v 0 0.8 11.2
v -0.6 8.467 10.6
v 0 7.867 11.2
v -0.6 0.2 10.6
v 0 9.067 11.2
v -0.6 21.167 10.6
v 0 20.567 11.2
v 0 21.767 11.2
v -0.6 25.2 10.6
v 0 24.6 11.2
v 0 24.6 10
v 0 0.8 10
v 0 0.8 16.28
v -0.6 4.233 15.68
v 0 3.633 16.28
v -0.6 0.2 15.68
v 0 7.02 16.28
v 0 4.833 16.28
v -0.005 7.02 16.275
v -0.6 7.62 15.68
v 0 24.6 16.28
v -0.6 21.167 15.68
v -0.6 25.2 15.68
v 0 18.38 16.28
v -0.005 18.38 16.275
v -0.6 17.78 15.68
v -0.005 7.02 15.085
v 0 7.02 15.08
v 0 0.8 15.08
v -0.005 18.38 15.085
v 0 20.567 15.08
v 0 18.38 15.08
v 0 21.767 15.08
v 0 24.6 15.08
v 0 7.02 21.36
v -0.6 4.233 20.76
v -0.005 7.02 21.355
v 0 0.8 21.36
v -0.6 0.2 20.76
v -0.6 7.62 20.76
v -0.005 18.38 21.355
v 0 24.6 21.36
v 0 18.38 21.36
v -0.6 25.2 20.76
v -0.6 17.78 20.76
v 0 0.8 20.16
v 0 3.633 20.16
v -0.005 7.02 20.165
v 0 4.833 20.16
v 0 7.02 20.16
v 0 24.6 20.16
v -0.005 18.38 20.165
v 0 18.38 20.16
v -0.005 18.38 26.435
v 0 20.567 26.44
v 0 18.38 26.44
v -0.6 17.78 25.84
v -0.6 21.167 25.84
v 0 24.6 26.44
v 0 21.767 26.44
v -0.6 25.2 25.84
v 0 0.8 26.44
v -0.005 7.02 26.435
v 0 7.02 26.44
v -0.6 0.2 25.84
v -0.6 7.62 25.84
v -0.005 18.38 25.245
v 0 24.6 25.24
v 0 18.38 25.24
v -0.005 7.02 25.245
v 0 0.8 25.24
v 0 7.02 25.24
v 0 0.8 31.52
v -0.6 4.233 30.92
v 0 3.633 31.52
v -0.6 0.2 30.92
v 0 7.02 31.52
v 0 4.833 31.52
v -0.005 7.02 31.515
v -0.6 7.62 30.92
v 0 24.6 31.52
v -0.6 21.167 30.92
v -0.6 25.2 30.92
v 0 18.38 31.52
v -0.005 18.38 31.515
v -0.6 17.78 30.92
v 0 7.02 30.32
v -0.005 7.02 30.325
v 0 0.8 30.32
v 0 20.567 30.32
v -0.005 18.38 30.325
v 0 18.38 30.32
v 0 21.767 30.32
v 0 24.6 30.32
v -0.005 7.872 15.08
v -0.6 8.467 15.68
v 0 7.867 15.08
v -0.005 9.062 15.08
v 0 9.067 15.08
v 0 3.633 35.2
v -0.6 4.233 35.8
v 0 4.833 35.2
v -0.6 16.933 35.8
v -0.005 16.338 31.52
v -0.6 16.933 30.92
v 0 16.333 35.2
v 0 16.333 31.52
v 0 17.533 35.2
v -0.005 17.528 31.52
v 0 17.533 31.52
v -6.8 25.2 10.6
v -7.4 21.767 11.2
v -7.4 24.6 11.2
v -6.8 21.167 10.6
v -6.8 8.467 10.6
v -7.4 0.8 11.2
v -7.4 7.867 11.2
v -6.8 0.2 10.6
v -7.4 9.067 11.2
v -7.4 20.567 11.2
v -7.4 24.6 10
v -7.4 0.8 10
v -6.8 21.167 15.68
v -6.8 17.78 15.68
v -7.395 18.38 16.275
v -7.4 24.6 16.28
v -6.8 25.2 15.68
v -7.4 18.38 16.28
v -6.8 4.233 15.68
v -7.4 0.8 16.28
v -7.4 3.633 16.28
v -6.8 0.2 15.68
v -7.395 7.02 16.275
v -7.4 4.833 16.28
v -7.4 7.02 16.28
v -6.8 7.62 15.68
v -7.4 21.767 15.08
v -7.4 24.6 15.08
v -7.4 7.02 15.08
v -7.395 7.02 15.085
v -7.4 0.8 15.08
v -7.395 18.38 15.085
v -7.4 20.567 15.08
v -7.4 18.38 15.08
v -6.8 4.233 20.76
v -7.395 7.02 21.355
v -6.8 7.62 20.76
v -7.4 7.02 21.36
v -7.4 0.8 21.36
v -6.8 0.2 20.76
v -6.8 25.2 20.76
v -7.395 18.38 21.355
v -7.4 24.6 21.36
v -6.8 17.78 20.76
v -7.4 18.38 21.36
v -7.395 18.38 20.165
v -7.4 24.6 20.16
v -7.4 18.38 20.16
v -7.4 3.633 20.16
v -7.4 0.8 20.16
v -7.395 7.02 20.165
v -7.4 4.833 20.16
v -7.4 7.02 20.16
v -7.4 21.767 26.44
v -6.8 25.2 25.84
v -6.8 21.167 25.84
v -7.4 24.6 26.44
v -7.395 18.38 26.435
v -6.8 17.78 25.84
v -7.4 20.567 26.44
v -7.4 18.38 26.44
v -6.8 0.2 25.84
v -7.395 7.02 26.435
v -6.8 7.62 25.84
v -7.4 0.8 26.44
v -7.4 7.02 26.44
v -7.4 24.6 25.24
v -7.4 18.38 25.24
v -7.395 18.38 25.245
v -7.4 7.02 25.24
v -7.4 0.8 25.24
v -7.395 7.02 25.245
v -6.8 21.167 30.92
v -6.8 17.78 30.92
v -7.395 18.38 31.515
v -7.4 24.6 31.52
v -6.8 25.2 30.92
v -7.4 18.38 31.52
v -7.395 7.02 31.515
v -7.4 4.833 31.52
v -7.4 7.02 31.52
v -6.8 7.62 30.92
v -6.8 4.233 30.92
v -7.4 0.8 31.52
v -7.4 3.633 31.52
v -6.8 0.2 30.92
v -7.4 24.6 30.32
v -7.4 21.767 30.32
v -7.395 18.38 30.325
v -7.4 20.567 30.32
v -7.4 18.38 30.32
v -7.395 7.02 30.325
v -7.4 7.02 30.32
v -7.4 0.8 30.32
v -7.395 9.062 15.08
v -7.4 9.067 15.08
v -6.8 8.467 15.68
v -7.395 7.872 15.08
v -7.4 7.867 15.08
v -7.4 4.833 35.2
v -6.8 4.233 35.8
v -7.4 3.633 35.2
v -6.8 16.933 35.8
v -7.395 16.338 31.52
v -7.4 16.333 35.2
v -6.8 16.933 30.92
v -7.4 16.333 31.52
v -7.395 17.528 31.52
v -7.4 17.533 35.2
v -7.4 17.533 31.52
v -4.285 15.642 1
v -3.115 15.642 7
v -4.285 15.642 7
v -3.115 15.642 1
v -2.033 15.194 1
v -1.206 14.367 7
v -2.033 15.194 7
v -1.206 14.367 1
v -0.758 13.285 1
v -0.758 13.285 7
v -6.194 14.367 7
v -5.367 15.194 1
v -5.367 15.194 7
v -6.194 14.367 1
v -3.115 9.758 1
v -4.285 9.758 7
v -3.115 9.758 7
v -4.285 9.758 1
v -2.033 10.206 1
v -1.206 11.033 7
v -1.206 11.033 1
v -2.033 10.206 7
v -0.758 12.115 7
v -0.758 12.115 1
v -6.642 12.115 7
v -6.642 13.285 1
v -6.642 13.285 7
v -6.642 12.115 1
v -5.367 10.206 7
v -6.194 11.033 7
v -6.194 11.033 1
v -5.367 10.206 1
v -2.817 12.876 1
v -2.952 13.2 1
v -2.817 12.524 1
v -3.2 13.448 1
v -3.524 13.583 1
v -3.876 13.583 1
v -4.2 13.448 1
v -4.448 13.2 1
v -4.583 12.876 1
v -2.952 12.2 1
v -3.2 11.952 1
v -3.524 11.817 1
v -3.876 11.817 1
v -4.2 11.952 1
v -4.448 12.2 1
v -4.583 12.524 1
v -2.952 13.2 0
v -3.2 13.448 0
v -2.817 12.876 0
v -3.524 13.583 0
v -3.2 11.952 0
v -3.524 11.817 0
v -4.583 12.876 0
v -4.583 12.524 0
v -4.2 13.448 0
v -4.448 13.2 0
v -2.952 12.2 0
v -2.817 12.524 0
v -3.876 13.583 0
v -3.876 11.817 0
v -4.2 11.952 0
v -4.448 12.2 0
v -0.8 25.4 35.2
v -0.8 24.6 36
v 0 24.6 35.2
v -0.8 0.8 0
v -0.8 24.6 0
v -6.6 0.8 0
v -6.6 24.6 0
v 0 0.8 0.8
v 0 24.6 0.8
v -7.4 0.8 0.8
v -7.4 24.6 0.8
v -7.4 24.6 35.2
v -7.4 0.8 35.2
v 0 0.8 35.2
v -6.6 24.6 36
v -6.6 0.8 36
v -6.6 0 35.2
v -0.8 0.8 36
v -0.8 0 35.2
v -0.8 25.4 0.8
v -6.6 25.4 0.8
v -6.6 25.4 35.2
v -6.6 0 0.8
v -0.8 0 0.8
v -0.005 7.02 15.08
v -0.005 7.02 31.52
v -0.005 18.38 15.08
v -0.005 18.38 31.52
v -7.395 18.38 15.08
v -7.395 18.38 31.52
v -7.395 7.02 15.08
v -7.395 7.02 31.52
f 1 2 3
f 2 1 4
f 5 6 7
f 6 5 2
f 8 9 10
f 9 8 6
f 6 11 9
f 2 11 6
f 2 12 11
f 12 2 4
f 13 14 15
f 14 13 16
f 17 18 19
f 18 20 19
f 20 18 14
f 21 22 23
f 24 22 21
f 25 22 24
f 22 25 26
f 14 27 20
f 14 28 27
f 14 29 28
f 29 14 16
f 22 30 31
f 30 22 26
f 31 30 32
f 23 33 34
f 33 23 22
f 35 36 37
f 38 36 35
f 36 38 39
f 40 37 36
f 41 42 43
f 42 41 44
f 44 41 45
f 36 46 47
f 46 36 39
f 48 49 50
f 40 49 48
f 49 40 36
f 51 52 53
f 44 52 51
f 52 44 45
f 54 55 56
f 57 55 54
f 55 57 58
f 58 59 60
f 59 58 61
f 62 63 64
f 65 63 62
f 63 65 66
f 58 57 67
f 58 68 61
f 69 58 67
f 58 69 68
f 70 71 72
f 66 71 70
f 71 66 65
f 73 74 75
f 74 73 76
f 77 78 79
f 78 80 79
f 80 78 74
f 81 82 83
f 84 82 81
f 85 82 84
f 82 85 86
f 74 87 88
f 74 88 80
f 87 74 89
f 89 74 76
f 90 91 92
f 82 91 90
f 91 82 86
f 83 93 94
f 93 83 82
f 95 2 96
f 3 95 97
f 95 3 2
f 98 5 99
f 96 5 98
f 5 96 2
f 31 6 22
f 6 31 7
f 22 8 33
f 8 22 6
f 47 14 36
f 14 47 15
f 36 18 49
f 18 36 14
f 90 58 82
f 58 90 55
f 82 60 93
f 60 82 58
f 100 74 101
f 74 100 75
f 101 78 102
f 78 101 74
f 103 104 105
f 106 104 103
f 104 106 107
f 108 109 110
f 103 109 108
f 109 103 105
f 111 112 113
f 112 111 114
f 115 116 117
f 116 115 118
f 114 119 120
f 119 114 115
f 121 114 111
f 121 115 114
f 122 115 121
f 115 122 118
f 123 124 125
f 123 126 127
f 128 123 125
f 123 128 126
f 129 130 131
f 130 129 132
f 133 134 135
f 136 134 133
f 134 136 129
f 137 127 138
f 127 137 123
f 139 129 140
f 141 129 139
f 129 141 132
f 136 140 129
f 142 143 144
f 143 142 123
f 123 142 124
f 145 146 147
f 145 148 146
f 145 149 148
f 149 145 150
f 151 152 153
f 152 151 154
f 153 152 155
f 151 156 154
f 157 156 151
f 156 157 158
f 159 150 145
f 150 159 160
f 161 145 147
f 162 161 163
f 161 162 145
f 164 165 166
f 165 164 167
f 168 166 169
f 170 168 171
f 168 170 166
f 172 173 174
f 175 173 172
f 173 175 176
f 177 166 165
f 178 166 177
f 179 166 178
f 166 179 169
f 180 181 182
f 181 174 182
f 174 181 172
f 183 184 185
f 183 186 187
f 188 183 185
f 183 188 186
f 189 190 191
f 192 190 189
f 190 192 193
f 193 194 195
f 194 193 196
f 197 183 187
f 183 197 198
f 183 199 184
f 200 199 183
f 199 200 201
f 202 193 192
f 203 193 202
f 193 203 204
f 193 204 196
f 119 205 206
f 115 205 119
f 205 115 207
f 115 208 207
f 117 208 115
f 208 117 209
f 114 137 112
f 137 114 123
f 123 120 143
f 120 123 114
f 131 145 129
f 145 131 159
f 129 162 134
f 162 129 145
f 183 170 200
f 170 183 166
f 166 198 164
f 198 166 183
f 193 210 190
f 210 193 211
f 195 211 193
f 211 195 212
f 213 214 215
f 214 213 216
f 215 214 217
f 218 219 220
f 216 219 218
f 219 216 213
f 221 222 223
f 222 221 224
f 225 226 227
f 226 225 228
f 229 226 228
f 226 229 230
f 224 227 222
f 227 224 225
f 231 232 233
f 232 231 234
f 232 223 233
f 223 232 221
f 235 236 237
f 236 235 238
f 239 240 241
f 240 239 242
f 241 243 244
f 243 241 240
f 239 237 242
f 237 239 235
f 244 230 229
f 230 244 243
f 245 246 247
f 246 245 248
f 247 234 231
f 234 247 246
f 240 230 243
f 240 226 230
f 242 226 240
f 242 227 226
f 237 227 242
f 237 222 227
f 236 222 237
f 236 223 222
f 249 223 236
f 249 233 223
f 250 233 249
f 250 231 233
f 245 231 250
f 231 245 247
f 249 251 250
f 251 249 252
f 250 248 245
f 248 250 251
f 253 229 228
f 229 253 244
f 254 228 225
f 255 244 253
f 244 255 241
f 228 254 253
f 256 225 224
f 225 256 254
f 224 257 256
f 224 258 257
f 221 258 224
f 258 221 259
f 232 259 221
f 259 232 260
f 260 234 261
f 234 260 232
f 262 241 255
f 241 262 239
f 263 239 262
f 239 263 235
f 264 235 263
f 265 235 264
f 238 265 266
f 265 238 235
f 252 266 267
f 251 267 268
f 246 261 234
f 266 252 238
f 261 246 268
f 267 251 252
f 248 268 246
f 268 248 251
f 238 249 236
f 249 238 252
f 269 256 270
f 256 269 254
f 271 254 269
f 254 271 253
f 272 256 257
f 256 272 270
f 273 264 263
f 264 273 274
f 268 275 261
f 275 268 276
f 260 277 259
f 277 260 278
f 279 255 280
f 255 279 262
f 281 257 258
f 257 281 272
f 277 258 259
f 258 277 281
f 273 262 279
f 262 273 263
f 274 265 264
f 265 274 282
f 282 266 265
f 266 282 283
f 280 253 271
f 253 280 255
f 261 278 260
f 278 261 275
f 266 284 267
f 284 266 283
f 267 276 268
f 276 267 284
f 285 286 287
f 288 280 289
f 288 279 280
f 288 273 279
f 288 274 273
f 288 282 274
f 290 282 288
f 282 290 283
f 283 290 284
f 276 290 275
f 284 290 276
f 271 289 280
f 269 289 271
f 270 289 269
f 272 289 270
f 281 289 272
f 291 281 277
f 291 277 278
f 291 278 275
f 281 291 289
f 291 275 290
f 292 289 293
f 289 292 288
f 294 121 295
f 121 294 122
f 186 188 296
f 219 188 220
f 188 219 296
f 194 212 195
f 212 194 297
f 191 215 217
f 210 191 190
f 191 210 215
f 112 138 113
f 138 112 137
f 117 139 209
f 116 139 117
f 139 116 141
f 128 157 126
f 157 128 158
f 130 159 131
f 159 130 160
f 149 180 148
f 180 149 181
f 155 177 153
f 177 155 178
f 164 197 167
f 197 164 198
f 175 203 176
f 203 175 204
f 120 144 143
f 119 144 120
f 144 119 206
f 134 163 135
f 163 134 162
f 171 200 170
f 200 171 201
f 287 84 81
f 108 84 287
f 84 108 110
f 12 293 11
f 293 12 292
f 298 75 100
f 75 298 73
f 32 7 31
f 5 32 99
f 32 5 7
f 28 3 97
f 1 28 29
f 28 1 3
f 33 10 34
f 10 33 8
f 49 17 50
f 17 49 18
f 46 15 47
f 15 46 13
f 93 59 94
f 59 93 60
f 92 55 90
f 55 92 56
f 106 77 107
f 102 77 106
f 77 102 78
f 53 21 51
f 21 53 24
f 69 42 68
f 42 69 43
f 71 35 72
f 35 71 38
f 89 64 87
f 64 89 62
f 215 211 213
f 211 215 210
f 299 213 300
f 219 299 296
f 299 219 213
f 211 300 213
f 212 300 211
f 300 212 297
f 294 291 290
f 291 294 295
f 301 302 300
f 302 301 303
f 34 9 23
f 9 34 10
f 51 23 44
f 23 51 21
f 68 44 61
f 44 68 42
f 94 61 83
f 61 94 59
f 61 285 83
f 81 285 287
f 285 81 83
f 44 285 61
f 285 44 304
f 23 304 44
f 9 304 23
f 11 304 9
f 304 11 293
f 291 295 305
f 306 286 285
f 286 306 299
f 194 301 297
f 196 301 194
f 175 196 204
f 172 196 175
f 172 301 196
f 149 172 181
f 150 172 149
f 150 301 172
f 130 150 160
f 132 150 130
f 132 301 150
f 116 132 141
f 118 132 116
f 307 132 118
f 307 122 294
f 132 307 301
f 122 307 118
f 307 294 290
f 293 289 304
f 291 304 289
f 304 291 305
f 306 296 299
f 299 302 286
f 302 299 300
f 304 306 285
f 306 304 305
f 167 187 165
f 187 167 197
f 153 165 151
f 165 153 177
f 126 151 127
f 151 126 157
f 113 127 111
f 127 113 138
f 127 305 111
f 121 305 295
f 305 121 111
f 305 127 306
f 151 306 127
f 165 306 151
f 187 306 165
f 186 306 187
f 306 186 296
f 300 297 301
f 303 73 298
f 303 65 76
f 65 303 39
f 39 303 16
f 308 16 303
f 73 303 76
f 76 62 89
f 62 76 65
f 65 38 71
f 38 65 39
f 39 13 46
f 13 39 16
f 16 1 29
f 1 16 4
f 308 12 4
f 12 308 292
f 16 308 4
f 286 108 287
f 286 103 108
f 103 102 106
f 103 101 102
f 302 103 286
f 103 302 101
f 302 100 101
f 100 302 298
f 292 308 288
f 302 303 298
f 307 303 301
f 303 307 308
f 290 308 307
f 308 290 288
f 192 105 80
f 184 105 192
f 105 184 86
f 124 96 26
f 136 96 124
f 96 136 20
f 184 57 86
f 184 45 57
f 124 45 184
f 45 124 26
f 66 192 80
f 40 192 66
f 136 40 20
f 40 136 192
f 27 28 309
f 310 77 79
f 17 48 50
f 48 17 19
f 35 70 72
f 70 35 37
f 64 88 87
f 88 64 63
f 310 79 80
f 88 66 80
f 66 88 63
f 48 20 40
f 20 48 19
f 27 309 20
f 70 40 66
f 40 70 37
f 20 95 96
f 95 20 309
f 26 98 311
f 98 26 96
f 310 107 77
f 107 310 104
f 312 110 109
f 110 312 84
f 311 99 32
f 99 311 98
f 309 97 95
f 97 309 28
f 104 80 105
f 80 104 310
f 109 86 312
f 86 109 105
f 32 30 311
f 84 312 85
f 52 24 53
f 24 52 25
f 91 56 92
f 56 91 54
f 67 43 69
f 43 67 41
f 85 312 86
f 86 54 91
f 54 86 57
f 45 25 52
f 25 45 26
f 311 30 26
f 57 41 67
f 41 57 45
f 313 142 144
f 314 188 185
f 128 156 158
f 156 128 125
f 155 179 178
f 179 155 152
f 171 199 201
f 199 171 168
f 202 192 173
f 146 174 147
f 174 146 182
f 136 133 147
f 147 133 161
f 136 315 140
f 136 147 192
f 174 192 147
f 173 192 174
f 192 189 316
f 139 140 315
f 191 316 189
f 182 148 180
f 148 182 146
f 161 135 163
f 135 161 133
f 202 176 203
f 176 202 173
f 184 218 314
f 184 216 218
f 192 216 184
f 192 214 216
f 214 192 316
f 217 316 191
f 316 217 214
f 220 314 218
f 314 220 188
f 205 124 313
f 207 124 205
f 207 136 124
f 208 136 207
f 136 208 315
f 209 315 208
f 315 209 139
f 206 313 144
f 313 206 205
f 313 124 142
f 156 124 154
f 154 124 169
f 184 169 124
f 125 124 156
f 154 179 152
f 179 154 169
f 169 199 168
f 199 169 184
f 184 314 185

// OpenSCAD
// file: wall_01_solid.scad
include <libs.scad>;

//wall
*linear_wall(4);
*round_wall(2);
corner_wall(6);
*shim_wall(2);
*import("finalized_stl/square_floor/floor_square_2x2_a.stl");

module shim_wall(size)
{
  translate([-wall_width/2,size*basis/2,floor_thick/2])hull()
  {
    cube([wall_width,basis*size-bevel*2,floor_thick-bevel*2],center=true);
    cube([wall_width-bevel*2,basis*size,floor_thick-bevel*2],center=true);
    cube([wall_width-bevel*2,basis*size-bevel*2,floor_thick],center=true);
  }
}


module linear_wall_base(size, height=wall_height)
{
    translate([-wall_width/2,size*basis/2,height/2])hull()
    {
        cube([wall_width-bevel*2,size*basis,height-bevel*2],center=true);
        cube([wall_width-bevel*2,size*basis-bevel*2,height],center=true);
        cube([wall_width,size*basis-bevel*2,height-bevel*2],center=true);
    }
}

module round_wall_base(size)
{
    difference()
    {
        hull()
        {
            translate([0,0,bevel])cylinder(r=size*basis+wall_width,h=wall_height-bevel*2);
            cylinder(r=size*basis+wall_width-bevel,h=wall_height);
        }
        cylinder(r=size*basis,h=wall_height);
        translate([0,0,-ep])cylinder(r1=size*basis+bevel,r2=size*basis,h=bevel);
        translate([0,0,wall_height-bevel+ep])cylinder(r2=size*basis+bevel,r1=size*basis,h=bevel);
    }
}

module linear_brick_grids(size)
{
    //one for each wall level, horizontal
    brick_h=(wall_height-floor_thick)/wall_layers;
    for (ii=[0:wall_layers-1])
    {
        translate([0,size*basis/2,floor_thick+ii*brick_h])rotate([0,45,0])cube([wall_groove*sqrt(2),size*basis*2,wall_groove*sqrt(2)],center=true);
    }
    //vertical
    //one above floor is off by half, then even, then off
    for (ii=[1:1:wall_layers])
    {
        for(jj=[0:.5:size+1])
        {
            translate([0,jj*basis-(ii%6)*basis/6,floor_thick+ii*brick_h-brick_h/2])rotate([0,0,45])cube([wall_groove*sqrt(2),wall_groove*sqrt(2),brick_h],center=true);
        }
    }
}

module round_brick_grids(size)
{
    brick_h=(wall_height-floor_thick)/wall_layers;
    //horizontal
    for (ii=[0:wall_layers-1])
    {
        translate([0,0,floor_thick+ii*brick_h])hull()
        {
            cylinder(r=basis*size+wall_groove,h=ep,center=true);
            cylinder(r=basis*size,h=wall_groove*2,center=true);
        }
    }
    //vertical
    //vertical should be shifted each layer
    for (ii=[1:1:wall_layers])
    {
        for(jj=[0:30/size:120])
        {
            rotate([0,0,jj+(ii%6)*(10/size)])translate([basis*size,0,floor_thick+ii*brick_h-brick_h/2])rotate([0,0,45])cube([wall_groove*sqrt(2),wall_groove*sqrt(2),brick_h],center=true);
        }
    }
}

module round_wall(size)
{
    xx=basis*size+wall_width;
    yy=basis*size+wall_width;
    zz=wall_height;
    difference()
    {
        intersection()
        {
            round_wall_base(size);
            translate([.5*(basis*size+wall_width),.5*(basis*size+wall_width),wall_height/2])hull()
            {
                cube([xx-bevel*2,yy,zz-bevel*2],center=true);
                cube([xx-bevel*2,yy-bevel*2,zz],center=true);
                cube([xx,yy-bevel*2,zz-bevel*2],center=true);
            }
        }
        hull()
        {
            cube([basis*size*2+bevel*2,ep,zz*3],center=true);
            cube([ep,basis*size*2+bevel*2,zz*3],center=true);
        }
        round_brick_grids(size);
    }
}

module linear_wall(size)
{
    difference()
    {
        linear_wall_base(size);
        linear_brick_grids(size);
        *translate([-wall_width,0,0])linear_brick_grids(size);
    }
}

module corner_wall(size)
{
  intersection()
  {
    linear_wall(size);
    //45 degree slope so we can do inside corners
    translate([0,0,0])hull()
    {
      //beveling
      translate([0,0,-ep])linear_extrude(wall_height+ep*2)offset(delta=-bevel)hull()
      {
        translate([0,basis*0.5*size])square([ep,basis*size-wall_tol*2],center=true);
        translate([-wall_width,basis*0.5*size])square([ep,basis*size-wall_tol*2-wall_width*2],center=true);
      }
      translate([0,0,bevel])linear_extrude(wall_height-bevel*2)hull()
      {
        translate([0,basis*0.5*size])square([ep,basis*size-wall_tol*2],center=true);
        translate([-wall_width,basis*0.5*size])square([ep,basis*size-wall_tol*2-wall_width*2],center=true);
      }
    }
  }
}
// main file
include <libs.scad>;
use <wall_01_solid.scad>;

linear_window(1);

module linear_window(size)
{
  brick_h=(wall_height-floor_thick)/wall_layers;
  window_h=brick_h*(wall_layers-2);
  difference()
  {
    linear_wall_base(size,wall_height);
    linear_brick_grids(size);
    translate([-wall_width,0,0])linear_brick_grids(size);
    translate([-wall_width/2,size*basis/2,floor_thick+window_h/2+brick_h])cube([wall_width*2,window_w,window_h],center=true);
    //bevel
    translate([0,size*basis/2,floor_thick+window_h/2+brick_h])hull()
    {
      translate([-wall_groove/2,0,0])cube([wall_groove,window_w,window_h],center=true);
      cube([ep,window_w+wall_groove*2,window_h+wall_groove*2],center=true);
    }
    translate([-wall_width,size*basis/2,floor_thick+window_h/2+brick_h])hull()
    {
      translate([+wall_groove/2,0,0])cube([wall_groove,window_w,window_h],center=true);
      cube([ep,window_w+wall_groove*2,window_h+wall_groove*2],center=true);
    }
    linear_mag_holes(size);
  }
  //window edge
  /*difference()
  {
    translate([-wall_width/2,size*basis/2,floor_thick+window_h/2+brick_h])cube([wall_width,window_edge,window_h],center=true);
  }*/
}
